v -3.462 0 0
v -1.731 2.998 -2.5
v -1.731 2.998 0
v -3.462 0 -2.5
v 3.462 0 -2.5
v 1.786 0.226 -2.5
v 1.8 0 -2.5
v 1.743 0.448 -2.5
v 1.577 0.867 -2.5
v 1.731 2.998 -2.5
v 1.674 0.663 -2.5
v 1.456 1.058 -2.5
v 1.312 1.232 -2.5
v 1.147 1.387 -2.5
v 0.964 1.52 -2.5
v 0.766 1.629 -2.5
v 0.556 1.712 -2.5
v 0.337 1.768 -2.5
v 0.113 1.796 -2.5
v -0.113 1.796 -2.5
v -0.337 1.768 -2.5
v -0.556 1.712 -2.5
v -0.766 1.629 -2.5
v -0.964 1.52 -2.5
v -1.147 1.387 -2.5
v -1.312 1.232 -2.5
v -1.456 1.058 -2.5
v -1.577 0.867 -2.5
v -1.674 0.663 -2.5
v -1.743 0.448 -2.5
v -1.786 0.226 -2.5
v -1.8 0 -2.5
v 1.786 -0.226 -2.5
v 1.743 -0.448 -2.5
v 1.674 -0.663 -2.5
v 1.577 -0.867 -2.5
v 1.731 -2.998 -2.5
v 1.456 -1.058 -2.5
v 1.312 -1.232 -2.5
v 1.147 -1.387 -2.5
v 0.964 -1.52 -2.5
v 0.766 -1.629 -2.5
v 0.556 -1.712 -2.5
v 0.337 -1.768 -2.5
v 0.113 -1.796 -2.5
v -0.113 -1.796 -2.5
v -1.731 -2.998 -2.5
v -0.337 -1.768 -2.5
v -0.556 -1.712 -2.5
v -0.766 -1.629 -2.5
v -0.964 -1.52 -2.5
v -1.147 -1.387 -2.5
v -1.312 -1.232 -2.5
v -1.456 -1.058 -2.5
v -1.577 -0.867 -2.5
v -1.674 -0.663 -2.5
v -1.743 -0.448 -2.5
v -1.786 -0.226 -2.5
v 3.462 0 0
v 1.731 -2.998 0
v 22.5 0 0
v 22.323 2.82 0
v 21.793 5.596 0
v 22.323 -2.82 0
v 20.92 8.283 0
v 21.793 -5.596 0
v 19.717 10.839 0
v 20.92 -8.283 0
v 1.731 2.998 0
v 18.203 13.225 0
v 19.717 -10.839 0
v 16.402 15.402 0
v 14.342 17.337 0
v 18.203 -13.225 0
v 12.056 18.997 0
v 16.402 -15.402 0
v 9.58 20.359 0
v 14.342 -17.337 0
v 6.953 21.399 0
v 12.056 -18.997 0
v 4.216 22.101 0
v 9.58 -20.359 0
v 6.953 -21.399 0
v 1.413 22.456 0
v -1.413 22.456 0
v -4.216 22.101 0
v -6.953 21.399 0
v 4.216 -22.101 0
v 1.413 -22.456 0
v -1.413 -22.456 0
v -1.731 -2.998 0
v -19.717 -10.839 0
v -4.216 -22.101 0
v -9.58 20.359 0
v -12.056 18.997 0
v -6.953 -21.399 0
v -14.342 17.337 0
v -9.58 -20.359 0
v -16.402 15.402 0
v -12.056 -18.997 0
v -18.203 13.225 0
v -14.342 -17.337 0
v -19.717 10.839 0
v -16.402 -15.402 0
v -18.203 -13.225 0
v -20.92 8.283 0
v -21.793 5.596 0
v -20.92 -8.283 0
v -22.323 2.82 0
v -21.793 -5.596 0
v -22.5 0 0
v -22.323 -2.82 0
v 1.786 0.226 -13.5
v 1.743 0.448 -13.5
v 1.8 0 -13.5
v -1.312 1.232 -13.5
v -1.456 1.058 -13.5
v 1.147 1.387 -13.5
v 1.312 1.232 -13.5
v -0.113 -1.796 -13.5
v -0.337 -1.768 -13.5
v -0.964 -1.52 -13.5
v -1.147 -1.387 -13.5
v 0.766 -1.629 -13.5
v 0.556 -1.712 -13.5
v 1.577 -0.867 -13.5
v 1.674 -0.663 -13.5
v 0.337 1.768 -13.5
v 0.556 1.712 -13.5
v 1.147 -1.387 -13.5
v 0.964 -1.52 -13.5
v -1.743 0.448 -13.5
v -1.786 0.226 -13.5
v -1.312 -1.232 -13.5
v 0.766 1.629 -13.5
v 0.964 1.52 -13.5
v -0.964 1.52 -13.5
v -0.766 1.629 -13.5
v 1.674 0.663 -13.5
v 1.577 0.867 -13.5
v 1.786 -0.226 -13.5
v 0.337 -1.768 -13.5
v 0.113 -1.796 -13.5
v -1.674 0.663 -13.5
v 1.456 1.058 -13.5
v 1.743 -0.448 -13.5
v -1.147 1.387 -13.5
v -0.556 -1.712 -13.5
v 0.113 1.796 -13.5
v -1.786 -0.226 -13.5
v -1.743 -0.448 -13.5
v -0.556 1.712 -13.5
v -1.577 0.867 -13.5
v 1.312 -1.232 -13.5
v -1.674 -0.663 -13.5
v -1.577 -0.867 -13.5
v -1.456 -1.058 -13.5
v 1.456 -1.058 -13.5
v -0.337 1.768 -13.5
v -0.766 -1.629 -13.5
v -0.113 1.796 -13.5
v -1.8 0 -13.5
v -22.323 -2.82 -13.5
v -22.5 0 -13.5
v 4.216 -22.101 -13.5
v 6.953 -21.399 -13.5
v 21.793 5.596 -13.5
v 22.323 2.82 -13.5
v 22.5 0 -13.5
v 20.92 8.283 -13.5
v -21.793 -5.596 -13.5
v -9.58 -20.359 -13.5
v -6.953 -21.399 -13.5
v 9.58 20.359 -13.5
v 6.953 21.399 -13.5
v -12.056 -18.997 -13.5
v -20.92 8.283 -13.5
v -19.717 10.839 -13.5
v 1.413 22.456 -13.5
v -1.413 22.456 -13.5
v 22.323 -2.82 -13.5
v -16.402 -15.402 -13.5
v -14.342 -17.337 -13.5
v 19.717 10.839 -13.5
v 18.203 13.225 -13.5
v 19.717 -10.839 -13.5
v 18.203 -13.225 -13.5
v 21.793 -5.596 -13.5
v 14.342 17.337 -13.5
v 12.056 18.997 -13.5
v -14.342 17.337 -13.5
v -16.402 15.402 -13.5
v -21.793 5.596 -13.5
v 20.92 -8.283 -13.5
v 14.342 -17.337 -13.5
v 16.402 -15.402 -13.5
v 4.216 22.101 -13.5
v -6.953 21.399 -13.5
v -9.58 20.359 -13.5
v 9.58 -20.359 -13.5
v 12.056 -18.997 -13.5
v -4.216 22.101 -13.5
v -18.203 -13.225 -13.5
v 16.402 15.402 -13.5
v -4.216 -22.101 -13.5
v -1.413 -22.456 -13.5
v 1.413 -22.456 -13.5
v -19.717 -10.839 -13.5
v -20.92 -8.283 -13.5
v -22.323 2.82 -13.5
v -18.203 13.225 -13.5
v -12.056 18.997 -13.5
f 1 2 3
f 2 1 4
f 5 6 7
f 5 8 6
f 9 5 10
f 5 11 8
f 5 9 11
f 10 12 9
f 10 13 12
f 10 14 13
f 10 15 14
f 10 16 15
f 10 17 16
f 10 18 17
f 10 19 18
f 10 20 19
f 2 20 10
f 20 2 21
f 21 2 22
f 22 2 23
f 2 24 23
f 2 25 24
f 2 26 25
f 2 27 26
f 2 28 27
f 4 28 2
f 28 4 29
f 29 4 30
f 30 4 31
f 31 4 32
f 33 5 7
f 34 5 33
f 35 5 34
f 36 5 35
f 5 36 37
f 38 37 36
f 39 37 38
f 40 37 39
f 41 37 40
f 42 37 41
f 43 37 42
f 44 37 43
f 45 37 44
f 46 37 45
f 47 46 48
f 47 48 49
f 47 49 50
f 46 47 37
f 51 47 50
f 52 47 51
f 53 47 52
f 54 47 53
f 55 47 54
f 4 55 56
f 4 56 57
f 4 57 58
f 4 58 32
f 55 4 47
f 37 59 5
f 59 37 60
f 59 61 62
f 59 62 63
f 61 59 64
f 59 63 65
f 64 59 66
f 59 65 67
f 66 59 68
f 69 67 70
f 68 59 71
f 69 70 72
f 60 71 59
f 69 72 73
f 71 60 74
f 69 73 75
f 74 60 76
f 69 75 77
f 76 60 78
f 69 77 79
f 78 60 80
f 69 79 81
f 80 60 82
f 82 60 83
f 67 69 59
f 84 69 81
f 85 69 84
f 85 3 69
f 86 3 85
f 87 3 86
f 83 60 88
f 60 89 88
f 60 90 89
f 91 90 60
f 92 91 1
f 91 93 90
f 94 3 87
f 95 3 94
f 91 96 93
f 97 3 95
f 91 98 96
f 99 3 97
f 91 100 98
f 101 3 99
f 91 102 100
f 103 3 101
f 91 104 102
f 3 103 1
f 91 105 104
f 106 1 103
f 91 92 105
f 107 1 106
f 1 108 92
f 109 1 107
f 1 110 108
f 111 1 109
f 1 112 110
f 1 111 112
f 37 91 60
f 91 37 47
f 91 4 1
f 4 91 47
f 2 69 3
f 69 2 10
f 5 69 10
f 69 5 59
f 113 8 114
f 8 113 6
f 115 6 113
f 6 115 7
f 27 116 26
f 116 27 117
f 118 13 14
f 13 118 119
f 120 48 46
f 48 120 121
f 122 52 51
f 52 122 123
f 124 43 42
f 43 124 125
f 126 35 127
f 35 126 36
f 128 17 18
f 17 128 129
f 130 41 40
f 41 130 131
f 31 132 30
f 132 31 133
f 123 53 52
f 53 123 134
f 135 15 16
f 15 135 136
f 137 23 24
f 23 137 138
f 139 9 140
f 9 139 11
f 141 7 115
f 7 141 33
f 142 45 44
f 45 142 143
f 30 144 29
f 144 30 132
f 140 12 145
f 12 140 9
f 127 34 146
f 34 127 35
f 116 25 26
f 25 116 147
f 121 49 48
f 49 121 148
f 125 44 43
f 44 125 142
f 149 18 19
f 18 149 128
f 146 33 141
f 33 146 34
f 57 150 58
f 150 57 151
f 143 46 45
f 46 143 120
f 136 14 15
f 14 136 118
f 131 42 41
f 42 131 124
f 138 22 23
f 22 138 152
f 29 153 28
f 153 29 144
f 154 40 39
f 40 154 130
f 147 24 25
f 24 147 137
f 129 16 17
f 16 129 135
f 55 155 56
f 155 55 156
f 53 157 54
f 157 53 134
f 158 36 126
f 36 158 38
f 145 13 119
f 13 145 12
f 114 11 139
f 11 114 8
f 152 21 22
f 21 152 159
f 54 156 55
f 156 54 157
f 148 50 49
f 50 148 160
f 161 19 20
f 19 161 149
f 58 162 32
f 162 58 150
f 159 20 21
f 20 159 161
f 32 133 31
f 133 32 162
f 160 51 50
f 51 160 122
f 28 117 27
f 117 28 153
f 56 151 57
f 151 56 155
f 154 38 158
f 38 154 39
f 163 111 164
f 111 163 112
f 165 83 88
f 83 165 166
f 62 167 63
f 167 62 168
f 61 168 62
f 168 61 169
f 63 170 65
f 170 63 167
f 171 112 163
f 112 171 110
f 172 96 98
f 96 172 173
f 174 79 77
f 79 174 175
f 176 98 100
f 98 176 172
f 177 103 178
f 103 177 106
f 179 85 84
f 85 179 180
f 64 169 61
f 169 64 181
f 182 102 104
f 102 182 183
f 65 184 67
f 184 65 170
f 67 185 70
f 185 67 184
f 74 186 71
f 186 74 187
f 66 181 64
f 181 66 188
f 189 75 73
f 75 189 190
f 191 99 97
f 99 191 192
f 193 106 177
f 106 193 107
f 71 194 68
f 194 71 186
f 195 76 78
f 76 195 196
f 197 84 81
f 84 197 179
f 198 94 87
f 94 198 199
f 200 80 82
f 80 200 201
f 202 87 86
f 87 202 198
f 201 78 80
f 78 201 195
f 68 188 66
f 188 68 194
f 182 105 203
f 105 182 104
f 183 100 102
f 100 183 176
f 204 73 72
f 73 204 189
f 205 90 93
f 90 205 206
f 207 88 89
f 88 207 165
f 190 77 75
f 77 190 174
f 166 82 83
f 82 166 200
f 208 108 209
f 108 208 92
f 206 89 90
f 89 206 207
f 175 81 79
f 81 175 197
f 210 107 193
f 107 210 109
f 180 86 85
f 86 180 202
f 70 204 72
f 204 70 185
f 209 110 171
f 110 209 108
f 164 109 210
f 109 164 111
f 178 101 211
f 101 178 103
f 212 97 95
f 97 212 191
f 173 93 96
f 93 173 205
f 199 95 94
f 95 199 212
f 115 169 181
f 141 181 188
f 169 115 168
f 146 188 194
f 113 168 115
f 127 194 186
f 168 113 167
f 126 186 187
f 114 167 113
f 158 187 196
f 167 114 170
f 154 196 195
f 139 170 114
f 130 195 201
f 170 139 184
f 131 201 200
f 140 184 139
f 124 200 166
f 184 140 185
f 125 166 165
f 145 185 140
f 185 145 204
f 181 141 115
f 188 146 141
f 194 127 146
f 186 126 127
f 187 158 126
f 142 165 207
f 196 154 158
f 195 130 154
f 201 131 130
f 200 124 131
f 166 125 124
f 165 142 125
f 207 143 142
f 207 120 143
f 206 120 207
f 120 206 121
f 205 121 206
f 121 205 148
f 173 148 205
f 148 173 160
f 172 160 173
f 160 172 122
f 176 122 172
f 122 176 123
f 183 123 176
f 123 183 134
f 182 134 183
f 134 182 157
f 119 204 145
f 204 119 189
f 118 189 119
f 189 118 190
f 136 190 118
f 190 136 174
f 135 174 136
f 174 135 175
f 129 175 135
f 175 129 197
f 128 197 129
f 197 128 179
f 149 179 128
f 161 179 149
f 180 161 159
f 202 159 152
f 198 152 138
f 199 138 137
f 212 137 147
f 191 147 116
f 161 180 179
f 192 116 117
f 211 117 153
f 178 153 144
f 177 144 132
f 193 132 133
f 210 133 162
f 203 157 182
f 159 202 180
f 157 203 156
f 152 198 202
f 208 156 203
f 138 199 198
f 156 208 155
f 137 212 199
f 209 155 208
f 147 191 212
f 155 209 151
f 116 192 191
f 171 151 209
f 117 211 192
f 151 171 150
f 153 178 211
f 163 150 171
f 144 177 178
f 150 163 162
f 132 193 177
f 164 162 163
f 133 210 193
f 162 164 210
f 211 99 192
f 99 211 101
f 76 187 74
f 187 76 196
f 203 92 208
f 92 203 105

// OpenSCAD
$fn = 50;

difference() {
	union() {
		translate(v = [0, 0, -13.5]) {
			cylinder(h = 13.5, r = 22.5);
		}
	}
	union() {
		translate(v = [0, 0, 0]) {
			rotate(a = [0, 0, 0]) {
				difference() {
					union() {
						translate(v = [0, 0, -2.5]) {
							linear_extrude(height = 2.5) {
								polygon(points = [[3.4619999999999997, 0.0], [1.7310000000000003, 2.9981799479017264], [-1.7309999999999992, 2.9981799479017264], [-3.4619999999999997, 4.2397272186481365e-16], [-1.7310000000000014, -2.998179947901726], [1.7309999999999977, -2.9981799479017277]]);
							}
						}
					}
					union();
				}
			}
		}
		#translate(v = [0, 0, -100.0]) {
			cylinder(h = 200, r = 1.8);
		}
	}
}
